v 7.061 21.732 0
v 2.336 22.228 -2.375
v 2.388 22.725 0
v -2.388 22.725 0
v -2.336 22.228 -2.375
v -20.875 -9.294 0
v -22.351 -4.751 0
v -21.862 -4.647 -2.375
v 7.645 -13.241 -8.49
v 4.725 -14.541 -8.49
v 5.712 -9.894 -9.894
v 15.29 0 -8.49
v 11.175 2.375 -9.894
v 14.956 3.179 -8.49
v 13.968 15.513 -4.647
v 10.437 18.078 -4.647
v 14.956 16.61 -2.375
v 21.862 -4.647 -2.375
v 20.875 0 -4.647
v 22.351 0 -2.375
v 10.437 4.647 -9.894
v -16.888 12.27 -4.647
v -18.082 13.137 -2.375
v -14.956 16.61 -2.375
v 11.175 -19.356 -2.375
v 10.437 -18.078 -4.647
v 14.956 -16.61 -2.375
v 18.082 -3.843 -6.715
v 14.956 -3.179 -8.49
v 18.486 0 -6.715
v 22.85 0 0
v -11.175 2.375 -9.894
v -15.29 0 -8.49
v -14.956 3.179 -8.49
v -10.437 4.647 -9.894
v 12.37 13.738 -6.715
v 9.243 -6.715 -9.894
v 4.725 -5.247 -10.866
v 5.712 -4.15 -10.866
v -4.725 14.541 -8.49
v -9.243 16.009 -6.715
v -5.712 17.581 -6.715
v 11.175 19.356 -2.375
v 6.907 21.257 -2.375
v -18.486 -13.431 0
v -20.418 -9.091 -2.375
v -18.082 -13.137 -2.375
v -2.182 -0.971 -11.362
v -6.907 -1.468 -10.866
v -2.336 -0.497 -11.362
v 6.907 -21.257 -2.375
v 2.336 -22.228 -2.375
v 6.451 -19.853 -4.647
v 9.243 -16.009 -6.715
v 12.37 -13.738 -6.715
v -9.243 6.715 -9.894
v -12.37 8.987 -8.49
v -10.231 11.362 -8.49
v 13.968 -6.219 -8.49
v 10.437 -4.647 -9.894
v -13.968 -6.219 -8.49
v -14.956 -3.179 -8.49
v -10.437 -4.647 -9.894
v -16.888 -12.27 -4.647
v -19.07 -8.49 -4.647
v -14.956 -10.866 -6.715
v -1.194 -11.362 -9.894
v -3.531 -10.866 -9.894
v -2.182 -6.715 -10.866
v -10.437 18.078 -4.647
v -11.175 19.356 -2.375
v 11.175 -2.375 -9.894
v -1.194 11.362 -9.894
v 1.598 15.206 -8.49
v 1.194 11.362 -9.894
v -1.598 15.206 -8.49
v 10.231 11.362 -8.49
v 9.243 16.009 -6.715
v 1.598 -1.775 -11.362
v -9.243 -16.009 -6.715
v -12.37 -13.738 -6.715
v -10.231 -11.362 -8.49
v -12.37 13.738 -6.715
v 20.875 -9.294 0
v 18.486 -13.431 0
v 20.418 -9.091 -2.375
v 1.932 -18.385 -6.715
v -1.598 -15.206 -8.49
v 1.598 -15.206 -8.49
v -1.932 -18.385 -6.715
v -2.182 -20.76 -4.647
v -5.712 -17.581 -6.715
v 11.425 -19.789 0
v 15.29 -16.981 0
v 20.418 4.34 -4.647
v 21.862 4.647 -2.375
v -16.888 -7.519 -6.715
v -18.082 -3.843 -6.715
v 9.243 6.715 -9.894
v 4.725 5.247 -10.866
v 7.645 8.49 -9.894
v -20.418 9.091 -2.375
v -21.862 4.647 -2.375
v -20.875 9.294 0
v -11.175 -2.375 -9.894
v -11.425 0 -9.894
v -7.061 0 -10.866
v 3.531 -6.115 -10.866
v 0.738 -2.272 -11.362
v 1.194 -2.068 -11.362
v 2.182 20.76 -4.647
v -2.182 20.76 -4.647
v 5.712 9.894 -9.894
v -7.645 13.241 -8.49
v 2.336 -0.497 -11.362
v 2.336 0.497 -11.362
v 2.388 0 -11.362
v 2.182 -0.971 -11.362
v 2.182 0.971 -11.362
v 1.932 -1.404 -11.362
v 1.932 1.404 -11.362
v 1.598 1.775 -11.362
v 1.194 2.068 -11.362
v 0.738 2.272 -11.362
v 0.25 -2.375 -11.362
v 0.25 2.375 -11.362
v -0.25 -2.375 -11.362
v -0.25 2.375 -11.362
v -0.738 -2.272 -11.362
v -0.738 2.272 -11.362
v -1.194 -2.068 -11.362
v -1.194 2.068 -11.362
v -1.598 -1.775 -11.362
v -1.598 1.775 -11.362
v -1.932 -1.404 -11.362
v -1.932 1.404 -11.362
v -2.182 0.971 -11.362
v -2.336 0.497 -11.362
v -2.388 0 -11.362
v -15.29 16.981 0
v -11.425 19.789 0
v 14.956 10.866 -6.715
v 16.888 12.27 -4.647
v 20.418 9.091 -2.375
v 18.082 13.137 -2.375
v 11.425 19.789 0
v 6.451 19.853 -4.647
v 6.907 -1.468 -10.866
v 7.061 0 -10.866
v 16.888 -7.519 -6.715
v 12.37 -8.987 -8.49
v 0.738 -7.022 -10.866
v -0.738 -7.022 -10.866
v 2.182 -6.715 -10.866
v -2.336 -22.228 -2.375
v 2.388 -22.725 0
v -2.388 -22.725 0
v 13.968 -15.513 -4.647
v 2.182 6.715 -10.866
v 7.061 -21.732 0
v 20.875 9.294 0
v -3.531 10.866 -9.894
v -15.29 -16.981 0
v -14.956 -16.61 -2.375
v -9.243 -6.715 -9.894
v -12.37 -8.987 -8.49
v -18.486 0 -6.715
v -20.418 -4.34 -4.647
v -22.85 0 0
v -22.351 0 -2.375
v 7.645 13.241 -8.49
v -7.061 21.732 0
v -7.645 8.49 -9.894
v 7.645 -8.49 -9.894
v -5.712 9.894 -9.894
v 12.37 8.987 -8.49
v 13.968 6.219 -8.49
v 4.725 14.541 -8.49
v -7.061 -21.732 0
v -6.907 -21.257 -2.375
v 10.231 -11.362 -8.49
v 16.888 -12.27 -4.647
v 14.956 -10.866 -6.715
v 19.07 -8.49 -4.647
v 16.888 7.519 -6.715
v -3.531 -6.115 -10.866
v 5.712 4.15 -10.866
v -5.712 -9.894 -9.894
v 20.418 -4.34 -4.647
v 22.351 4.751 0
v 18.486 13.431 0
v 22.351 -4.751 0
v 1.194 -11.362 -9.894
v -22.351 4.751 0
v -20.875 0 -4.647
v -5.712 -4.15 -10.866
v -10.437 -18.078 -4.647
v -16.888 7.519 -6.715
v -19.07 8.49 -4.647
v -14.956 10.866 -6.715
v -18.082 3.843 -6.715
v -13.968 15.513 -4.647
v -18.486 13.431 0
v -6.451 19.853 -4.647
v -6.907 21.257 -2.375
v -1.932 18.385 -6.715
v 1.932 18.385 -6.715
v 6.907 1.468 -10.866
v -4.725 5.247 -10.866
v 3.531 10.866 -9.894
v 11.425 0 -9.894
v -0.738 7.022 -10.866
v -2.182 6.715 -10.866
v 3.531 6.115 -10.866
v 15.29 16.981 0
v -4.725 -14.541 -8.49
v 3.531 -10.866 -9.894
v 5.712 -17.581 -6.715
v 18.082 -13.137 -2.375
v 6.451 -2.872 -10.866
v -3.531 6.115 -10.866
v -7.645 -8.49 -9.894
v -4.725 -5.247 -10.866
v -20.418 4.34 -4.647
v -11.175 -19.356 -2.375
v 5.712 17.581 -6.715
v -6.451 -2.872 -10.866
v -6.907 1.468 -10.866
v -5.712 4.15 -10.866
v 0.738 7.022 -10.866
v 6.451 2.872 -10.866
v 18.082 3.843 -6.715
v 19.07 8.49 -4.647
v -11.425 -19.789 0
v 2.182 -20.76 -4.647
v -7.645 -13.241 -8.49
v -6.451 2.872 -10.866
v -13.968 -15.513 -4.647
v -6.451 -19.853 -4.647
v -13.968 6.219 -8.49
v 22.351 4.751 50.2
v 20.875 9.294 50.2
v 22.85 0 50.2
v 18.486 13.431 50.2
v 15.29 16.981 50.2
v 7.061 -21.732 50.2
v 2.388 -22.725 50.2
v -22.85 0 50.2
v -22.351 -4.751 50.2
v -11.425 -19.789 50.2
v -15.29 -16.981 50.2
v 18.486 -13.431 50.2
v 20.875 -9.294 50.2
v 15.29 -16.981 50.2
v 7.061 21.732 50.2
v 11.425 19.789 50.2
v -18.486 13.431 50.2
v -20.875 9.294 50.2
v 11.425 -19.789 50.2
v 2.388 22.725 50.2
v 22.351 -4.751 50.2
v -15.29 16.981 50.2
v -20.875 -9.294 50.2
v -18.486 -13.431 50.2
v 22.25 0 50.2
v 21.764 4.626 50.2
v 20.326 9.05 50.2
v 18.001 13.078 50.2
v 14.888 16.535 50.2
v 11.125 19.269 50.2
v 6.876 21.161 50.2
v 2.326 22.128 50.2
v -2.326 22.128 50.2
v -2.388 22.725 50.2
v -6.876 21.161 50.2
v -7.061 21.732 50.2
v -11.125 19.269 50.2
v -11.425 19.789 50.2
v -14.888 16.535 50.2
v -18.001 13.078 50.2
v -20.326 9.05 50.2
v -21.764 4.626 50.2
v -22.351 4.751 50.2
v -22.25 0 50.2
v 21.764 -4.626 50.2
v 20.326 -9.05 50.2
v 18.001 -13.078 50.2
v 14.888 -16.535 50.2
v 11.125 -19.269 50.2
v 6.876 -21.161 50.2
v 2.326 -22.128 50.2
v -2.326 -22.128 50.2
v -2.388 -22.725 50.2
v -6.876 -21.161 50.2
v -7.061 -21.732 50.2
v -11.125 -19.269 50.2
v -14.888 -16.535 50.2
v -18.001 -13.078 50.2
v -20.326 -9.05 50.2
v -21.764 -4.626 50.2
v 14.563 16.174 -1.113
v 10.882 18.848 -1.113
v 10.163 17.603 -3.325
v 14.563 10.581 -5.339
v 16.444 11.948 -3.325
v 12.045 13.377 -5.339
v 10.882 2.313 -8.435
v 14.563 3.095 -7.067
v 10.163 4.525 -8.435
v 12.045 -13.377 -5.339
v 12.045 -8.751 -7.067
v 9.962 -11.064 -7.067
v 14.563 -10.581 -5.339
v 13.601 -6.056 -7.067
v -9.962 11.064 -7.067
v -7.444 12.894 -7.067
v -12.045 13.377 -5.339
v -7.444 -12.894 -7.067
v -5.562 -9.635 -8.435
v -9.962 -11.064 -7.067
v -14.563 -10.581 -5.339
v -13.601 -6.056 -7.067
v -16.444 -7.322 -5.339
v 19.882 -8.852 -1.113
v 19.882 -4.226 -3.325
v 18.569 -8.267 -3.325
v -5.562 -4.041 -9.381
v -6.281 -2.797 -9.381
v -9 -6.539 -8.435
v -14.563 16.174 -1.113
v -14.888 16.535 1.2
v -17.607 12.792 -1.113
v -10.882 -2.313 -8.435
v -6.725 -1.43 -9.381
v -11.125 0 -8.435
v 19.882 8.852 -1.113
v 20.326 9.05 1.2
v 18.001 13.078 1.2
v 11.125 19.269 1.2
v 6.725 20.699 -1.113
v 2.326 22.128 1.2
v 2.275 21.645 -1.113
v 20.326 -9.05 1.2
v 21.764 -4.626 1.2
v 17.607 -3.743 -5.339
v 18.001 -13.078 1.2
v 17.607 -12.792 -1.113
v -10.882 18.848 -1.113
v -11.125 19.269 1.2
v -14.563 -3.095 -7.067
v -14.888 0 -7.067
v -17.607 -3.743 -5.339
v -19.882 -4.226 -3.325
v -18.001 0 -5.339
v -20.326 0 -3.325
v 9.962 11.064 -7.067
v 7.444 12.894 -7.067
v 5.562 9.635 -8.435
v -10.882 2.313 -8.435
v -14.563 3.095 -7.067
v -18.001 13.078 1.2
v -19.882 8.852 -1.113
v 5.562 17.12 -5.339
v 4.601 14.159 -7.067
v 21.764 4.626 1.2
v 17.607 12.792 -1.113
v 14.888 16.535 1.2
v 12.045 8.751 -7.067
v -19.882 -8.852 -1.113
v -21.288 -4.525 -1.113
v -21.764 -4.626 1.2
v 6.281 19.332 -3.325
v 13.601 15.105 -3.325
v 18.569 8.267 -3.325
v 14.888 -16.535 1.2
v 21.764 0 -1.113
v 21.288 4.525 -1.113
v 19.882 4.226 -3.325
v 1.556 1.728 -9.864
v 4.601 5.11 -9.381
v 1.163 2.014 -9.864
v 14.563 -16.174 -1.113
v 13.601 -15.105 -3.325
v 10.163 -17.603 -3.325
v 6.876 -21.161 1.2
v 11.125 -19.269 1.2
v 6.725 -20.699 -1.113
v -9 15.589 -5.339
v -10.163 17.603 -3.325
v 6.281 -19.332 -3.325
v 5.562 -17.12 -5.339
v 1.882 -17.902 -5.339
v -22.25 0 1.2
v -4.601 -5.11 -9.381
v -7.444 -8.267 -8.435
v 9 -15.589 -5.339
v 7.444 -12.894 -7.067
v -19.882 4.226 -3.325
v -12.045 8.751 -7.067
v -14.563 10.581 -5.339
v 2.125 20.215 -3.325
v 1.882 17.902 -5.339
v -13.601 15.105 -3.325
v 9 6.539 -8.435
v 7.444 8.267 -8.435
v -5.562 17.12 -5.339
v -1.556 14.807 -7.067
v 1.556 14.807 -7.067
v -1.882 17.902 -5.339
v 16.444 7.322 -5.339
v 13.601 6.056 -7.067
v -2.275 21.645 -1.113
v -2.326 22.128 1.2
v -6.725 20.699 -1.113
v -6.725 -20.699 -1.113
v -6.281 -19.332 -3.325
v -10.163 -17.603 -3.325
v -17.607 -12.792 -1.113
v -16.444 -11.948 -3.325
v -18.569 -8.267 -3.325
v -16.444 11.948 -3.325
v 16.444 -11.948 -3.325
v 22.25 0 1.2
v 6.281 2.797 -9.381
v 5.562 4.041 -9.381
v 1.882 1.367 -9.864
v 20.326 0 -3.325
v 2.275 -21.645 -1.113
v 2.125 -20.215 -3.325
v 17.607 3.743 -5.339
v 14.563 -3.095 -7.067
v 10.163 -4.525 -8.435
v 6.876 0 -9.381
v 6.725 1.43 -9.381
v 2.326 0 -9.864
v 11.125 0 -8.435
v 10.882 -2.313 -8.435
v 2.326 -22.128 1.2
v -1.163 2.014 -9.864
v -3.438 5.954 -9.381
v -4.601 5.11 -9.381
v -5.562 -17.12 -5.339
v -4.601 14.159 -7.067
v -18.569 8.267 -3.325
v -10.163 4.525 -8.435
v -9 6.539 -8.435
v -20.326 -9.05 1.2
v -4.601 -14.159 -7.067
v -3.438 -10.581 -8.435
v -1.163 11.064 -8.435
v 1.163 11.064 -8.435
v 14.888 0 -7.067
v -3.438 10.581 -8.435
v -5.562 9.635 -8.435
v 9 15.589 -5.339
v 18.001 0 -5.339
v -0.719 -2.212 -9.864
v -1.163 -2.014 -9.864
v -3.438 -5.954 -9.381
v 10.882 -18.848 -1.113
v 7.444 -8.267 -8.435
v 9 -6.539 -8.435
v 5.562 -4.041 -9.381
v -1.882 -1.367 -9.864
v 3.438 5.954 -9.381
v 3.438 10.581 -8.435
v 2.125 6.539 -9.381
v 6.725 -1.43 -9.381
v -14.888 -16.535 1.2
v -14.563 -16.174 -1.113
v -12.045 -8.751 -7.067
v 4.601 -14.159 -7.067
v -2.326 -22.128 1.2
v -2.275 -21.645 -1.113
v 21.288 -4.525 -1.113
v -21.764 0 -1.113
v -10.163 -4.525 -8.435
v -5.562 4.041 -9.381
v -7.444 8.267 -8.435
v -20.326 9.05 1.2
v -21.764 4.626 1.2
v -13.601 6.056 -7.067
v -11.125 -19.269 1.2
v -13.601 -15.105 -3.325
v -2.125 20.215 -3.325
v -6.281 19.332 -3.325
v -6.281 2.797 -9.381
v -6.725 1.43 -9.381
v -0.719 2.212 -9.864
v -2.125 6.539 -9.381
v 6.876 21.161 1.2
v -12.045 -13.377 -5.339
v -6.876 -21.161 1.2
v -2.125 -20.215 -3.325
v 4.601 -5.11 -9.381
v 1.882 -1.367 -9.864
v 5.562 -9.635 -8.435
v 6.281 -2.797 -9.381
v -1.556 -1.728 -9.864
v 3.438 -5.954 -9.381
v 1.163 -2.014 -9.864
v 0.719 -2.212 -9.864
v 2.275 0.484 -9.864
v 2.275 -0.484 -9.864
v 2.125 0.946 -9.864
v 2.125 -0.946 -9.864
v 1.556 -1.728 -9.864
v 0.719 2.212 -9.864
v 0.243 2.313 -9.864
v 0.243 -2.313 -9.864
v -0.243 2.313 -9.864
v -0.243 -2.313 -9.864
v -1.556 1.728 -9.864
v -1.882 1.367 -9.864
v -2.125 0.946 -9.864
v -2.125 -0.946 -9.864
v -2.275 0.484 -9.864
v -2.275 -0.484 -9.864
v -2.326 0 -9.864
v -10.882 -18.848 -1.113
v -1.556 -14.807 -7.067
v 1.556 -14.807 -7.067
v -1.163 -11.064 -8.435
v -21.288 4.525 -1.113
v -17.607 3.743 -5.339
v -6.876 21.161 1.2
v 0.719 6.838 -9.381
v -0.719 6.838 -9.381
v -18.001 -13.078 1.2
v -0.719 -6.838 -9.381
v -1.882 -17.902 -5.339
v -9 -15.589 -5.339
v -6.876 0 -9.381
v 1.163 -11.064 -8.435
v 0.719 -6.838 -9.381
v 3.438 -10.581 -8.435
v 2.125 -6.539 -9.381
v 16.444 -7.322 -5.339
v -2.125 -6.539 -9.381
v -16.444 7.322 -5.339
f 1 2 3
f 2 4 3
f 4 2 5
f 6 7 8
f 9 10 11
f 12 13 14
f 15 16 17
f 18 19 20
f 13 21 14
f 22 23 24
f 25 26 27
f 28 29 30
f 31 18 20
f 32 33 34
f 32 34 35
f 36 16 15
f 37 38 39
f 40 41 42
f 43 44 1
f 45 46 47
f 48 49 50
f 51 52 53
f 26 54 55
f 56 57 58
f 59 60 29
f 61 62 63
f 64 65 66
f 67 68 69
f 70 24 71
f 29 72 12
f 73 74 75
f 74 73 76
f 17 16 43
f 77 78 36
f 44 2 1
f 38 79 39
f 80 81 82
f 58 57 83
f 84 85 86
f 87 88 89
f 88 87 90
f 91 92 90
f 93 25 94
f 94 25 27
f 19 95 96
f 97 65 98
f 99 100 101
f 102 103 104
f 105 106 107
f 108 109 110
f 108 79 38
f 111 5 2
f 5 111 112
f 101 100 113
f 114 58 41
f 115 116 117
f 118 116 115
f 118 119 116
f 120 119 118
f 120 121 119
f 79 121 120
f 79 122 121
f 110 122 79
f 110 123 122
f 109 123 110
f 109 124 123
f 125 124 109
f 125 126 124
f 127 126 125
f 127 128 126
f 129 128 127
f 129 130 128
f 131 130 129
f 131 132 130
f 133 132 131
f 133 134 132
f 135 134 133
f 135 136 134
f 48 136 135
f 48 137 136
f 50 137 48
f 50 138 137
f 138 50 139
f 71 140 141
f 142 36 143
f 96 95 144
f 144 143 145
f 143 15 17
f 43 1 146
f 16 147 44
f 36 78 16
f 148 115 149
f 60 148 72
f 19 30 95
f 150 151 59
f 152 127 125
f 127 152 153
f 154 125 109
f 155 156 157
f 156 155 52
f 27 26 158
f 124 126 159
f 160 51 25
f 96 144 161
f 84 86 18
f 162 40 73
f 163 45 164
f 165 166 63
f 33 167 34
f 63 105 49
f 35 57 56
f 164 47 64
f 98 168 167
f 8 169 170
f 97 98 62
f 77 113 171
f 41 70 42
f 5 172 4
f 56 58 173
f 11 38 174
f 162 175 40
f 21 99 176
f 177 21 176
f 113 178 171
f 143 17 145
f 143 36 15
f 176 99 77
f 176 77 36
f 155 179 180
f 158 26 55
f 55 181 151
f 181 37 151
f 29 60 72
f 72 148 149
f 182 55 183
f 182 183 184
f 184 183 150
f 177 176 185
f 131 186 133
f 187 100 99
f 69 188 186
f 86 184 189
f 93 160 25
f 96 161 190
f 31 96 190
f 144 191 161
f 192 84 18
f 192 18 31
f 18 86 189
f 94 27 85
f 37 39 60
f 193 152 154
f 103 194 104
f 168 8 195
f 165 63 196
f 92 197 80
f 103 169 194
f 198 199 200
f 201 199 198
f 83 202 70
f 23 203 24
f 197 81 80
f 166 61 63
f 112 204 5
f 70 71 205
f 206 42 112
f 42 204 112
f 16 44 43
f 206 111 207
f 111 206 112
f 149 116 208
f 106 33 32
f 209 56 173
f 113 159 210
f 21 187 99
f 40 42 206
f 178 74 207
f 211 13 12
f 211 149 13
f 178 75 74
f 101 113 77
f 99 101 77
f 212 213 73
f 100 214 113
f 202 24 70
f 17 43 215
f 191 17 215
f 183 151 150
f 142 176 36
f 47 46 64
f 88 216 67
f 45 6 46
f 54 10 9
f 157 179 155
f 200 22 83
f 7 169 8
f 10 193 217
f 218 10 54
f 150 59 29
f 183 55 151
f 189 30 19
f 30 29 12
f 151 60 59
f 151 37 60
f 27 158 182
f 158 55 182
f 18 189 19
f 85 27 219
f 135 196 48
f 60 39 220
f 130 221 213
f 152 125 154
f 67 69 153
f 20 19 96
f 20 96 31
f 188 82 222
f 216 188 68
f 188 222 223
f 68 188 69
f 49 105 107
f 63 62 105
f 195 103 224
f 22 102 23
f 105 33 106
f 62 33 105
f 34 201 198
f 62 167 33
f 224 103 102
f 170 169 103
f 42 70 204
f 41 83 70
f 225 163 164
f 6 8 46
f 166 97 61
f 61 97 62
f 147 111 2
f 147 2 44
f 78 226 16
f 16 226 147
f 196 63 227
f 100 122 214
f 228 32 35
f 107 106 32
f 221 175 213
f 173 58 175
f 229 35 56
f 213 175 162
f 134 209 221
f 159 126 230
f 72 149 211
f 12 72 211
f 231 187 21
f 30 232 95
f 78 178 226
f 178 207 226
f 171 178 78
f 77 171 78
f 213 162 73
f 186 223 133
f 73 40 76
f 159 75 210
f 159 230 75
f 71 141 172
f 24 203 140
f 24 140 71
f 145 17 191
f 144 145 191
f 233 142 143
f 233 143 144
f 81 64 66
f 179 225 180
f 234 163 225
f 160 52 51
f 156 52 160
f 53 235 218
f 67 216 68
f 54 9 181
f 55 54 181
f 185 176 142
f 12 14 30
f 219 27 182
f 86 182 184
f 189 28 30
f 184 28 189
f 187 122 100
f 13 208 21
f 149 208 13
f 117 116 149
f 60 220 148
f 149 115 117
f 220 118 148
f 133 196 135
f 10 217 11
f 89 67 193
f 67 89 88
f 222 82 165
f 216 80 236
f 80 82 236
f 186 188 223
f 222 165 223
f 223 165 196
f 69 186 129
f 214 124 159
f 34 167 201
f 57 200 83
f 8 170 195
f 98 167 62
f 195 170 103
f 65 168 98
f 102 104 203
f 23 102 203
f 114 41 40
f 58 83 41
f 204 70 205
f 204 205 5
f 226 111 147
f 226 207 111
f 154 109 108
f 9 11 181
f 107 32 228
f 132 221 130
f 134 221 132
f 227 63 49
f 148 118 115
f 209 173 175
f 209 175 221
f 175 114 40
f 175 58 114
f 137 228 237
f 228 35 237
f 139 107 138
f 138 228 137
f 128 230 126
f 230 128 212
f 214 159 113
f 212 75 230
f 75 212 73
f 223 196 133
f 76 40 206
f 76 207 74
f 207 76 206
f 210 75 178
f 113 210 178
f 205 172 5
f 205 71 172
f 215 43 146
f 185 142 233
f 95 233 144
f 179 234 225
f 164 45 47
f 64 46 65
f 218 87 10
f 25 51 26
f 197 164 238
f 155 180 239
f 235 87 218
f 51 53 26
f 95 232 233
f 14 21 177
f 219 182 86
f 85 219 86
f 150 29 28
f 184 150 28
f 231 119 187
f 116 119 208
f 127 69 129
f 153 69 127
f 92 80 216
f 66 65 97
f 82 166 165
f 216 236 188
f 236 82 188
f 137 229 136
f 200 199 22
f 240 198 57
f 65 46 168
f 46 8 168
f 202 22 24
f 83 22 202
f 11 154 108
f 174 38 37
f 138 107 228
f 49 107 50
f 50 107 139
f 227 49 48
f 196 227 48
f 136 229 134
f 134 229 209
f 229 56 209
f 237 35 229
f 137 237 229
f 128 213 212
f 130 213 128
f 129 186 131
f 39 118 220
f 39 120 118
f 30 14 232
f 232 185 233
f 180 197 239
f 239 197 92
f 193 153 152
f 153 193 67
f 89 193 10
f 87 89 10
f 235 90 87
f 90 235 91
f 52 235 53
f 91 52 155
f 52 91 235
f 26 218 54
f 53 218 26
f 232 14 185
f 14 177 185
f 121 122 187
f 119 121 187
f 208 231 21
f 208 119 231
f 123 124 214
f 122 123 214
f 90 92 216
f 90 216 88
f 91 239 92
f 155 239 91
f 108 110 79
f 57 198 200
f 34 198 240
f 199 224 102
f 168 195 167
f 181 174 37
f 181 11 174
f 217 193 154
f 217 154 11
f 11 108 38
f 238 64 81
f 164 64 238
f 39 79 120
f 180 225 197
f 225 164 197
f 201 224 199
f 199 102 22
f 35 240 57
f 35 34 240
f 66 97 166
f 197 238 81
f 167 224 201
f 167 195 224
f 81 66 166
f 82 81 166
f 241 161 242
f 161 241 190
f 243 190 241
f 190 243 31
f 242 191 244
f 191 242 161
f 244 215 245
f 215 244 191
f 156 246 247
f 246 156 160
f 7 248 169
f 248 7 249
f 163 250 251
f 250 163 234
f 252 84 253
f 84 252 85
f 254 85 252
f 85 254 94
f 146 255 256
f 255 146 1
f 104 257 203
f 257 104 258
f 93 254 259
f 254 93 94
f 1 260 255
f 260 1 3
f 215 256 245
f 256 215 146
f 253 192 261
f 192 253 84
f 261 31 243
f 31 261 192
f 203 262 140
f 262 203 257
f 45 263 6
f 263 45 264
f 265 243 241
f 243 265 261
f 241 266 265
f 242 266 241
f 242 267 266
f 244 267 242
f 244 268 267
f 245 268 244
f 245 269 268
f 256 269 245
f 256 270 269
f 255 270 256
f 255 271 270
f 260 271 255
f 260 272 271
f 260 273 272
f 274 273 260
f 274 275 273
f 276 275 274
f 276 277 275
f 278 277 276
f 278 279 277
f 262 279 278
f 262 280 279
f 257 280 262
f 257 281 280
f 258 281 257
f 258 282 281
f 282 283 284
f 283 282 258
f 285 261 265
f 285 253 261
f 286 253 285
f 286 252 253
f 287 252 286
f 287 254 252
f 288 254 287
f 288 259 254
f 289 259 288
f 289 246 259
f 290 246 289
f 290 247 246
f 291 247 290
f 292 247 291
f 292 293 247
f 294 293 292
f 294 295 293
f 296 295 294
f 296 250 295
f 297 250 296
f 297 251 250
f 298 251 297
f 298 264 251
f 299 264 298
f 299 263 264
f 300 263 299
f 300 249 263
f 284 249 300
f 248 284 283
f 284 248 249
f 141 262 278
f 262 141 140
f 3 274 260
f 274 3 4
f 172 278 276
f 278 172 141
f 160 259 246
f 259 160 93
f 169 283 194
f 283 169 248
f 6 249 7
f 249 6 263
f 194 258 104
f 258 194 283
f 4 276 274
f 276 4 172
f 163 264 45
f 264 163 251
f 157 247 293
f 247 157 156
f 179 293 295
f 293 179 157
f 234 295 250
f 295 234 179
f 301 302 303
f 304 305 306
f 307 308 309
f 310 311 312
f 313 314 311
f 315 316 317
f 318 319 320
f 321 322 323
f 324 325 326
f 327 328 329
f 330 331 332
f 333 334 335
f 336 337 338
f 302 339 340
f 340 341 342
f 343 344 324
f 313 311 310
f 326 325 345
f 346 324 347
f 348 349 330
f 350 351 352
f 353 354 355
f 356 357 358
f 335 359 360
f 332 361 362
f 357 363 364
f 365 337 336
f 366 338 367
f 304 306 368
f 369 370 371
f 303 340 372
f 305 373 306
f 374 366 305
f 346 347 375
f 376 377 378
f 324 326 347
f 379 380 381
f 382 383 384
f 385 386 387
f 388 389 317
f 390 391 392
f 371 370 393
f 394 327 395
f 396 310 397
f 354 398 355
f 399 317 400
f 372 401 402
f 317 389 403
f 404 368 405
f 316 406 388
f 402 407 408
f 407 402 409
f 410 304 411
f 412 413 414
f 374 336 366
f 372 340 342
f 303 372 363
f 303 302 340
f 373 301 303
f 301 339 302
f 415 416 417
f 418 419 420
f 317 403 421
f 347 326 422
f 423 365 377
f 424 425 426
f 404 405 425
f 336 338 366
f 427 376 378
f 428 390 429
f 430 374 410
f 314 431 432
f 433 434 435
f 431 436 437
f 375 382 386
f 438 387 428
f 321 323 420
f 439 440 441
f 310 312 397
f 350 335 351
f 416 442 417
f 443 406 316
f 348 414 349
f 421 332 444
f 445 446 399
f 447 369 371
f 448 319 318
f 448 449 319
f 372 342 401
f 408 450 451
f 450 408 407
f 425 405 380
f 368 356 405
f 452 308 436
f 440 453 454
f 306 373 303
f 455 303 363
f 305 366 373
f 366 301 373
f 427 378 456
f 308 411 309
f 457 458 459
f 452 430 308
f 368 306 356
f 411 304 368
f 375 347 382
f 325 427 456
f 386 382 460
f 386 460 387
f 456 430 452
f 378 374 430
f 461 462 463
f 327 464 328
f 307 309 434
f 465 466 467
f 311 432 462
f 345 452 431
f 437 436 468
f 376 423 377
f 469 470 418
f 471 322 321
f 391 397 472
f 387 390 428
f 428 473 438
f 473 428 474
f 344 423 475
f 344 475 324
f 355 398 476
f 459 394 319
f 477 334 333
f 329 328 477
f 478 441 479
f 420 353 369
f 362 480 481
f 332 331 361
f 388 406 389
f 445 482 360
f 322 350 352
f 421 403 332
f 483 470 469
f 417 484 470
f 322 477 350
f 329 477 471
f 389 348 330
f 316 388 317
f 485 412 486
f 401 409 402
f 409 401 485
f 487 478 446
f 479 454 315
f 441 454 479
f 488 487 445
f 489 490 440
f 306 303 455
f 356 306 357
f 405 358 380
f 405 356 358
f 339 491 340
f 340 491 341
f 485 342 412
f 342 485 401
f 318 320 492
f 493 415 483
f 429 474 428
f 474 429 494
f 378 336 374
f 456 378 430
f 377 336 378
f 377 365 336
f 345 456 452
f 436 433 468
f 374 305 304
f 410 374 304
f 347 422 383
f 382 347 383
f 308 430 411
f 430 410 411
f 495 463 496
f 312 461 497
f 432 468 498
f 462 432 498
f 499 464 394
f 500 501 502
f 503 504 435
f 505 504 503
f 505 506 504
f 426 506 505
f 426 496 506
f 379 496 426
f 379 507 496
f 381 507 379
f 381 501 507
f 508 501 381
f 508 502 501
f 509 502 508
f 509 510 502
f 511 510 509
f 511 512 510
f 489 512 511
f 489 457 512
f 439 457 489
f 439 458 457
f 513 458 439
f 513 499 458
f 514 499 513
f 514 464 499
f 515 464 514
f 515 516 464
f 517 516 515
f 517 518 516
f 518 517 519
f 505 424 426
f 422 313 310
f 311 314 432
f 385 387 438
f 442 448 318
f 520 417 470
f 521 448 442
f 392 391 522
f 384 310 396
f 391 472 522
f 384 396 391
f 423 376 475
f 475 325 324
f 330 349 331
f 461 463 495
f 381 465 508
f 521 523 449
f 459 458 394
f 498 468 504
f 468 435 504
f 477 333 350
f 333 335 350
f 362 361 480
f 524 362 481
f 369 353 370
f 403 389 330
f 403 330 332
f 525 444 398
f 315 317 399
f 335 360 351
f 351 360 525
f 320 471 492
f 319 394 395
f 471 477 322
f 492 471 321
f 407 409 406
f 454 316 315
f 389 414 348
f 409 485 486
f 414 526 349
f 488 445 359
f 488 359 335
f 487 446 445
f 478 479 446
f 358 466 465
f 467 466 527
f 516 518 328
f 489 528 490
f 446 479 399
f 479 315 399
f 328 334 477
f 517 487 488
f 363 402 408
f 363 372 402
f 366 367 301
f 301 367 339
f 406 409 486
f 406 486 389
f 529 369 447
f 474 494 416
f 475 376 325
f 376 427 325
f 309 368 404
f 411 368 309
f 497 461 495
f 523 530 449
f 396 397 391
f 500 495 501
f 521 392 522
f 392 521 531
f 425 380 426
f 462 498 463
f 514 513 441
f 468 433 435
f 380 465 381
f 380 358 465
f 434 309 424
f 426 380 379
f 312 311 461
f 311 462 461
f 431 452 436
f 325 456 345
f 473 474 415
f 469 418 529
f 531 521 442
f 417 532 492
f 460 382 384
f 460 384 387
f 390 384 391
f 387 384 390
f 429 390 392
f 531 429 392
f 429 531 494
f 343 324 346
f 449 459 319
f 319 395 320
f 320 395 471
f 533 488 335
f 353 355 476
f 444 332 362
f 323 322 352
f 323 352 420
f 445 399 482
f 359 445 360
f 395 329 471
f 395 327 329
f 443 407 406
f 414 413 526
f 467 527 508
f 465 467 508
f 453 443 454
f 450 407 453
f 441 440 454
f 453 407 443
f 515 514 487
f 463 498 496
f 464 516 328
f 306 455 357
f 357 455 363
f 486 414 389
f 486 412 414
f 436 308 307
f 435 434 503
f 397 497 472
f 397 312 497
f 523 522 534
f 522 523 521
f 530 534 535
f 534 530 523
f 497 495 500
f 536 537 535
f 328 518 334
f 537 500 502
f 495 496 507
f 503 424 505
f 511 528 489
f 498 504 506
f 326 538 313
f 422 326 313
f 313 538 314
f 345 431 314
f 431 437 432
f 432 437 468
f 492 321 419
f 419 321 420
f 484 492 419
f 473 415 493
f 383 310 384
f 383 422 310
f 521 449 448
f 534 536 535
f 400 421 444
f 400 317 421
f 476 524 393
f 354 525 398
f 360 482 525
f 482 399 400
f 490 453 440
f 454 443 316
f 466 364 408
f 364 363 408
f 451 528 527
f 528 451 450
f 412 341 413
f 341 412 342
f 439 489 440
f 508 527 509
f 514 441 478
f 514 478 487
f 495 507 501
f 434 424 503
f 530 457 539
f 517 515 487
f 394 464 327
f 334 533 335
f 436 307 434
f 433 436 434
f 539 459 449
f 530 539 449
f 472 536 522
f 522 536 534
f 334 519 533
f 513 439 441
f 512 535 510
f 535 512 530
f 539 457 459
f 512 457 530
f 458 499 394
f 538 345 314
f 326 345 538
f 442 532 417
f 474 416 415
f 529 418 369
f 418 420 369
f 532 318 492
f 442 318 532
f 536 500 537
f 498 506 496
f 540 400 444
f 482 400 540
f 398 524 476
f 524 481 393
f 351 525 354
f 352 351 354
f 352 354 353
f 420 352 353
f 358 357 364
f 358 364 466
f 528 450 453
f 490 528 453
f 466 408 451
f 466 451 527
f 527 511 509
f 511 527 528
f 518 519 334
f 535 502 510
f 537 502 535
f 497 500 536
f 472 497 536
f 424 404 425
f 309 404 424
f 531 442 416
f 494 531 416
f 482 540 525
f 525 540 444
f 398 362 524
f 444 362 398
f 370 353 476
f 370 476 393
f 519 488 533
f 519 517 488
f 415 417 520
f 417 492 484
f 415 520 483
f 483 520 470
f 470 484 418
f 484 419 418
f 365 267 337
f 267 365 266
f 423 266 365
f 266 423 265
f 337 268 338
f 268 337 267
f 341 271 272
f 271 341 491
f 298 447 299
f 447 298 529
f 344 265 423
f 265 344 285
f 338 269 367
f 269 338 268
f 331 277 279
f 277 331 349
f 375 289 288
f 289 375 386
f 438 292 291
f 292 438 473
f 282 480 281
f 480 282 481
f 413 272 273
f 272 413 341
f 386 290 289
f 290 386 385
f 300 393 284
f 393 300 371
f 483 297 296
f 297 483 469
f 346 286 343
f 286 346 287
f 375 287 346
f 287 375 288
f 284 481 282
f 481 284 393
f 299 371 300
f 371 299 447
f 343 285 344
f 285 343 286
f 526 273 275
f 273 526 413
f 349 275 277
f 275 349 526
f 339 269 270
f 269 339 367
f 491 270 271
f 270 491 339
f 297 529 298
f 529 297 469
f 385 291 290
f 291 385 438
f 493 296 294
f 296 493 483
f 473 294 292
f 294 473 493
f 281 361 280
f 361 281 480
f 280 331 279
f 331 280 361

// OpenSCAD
//Massage Wand Head Cover
//CudaTox (@cudatox) 2017

/*

Copyright 2017 Cudatox

Redistribution and use in source and binary forms, with or without modification, are permitted provided that the following conditions are met:

1. Redistributions of source code must retain the above copyright notice, this list of conditions and the following disclaimer.

2. Redistributions in binary form must reproduce the above copyright notice, this list of conditions and the following disclaimer in the documentation and/or other materials provided with the distribution.

THIS SOFTWARE IS PROVIDED BY THE COPYRIGHT HOLDERS AND CONTRIBUTORS "AS IS" AND ANY EXPRESS OR IMPLIED WARRANTIES, INCLUDING, BUT NOT LIMITED TO, THE IMPLIED WARRANTIES OF MERCHANTABILITY AND FITNESS FOR A PARTICULAR PURPOSE ARE DISCLAIMED. IN NO EVENT SHALL THE COPYRIGHT HOLDER OR CONTRIBUTORS BE LIABLE FOR ANY DIRECT, INDIRECT, INCIDENTAL, SPECIAL, EXEMPLARY, OR CONSEQUENTIAL DAMAGES (INCLUDING, BUT NOT LIMITED TO, PROCUREMENT OF SUBSTITUTE GOODS OR SERVICES; LOSS OF USE, DATA, OR PROFITS; OR BUSINESS INTERRUPTION) HOWEVER CAUSED AND ON ANY THEORY OF LIABILITY, WHETHER IN CONTRACT, STRICT LIABILITY, OR TORT (INCLUDING NEGLIGENCE OR OTHERWISE) ARISING IN ANY WAY OUT OF THE USE OF THIS SOFTWARE, EVEN IF ADVISED OF THE POSSIBILITY OF SUCH DAMAGE.

*/

//INSTRUCTIONS

//This is a cover for the head of the massager intended to prevent fluid ingress.
//It is designed to be printed in a flexible filament such as TPU and slipped over
//the head of the massager to prevent fluid ingress. 

//This script uses the same variables as the tip, so copy them here

//OR

//Measure your massager tip and override outside_dia and head_body_length

cover_thickness = 1.2;          //Thickness of the cover
tol = 0.5;                      //Extra space between massager tip and cover

mass_radius = 20;               //Clearance required by the rotating mass
shell_thickness = 2;            //Minimum thickness
motor_body_length = 32;         //Overall length of motor cavity including terminals
motor_cabling_tolerance = 3 ;   //Thickness of the shell behind the motor
motor_shaft_offset = 12;        //Extra body length to account for height of the mass.
motor_retention_thickness = 2;  //Thickness of the retention slot
sphere_top_scale = 0.5;         //"Roundness" of the tip

added_length = cover_thickness;

outside_dia = mass_radius * 2 + shell_thickness * 2 + tol;
head_body_length = max(outside_dia/2, (motor_body_length + motor_cabling_tolerance + motor_shaft_offset + motor_retention_thickness)) + added_length;

$fs = 0.5;

echo(outside_dia);

difference(){
    union(){
        //Head
        scale([1,1,sphere_top_scale])
        sphere(d = outside_dia + cover_thickness, center=true);
        cylinder(d = outside_dia + cover_thickness, h = head_body_length, center=false);
    }
    translate([0,0,cover_thickness])
    union(){
        //Head
        scale([1,1,sphere_top_scale])
        sphere(d = outside_dia, center=true);
        cylinder(d = outside_dia, h = head_body_length, center=false);
    }
}
